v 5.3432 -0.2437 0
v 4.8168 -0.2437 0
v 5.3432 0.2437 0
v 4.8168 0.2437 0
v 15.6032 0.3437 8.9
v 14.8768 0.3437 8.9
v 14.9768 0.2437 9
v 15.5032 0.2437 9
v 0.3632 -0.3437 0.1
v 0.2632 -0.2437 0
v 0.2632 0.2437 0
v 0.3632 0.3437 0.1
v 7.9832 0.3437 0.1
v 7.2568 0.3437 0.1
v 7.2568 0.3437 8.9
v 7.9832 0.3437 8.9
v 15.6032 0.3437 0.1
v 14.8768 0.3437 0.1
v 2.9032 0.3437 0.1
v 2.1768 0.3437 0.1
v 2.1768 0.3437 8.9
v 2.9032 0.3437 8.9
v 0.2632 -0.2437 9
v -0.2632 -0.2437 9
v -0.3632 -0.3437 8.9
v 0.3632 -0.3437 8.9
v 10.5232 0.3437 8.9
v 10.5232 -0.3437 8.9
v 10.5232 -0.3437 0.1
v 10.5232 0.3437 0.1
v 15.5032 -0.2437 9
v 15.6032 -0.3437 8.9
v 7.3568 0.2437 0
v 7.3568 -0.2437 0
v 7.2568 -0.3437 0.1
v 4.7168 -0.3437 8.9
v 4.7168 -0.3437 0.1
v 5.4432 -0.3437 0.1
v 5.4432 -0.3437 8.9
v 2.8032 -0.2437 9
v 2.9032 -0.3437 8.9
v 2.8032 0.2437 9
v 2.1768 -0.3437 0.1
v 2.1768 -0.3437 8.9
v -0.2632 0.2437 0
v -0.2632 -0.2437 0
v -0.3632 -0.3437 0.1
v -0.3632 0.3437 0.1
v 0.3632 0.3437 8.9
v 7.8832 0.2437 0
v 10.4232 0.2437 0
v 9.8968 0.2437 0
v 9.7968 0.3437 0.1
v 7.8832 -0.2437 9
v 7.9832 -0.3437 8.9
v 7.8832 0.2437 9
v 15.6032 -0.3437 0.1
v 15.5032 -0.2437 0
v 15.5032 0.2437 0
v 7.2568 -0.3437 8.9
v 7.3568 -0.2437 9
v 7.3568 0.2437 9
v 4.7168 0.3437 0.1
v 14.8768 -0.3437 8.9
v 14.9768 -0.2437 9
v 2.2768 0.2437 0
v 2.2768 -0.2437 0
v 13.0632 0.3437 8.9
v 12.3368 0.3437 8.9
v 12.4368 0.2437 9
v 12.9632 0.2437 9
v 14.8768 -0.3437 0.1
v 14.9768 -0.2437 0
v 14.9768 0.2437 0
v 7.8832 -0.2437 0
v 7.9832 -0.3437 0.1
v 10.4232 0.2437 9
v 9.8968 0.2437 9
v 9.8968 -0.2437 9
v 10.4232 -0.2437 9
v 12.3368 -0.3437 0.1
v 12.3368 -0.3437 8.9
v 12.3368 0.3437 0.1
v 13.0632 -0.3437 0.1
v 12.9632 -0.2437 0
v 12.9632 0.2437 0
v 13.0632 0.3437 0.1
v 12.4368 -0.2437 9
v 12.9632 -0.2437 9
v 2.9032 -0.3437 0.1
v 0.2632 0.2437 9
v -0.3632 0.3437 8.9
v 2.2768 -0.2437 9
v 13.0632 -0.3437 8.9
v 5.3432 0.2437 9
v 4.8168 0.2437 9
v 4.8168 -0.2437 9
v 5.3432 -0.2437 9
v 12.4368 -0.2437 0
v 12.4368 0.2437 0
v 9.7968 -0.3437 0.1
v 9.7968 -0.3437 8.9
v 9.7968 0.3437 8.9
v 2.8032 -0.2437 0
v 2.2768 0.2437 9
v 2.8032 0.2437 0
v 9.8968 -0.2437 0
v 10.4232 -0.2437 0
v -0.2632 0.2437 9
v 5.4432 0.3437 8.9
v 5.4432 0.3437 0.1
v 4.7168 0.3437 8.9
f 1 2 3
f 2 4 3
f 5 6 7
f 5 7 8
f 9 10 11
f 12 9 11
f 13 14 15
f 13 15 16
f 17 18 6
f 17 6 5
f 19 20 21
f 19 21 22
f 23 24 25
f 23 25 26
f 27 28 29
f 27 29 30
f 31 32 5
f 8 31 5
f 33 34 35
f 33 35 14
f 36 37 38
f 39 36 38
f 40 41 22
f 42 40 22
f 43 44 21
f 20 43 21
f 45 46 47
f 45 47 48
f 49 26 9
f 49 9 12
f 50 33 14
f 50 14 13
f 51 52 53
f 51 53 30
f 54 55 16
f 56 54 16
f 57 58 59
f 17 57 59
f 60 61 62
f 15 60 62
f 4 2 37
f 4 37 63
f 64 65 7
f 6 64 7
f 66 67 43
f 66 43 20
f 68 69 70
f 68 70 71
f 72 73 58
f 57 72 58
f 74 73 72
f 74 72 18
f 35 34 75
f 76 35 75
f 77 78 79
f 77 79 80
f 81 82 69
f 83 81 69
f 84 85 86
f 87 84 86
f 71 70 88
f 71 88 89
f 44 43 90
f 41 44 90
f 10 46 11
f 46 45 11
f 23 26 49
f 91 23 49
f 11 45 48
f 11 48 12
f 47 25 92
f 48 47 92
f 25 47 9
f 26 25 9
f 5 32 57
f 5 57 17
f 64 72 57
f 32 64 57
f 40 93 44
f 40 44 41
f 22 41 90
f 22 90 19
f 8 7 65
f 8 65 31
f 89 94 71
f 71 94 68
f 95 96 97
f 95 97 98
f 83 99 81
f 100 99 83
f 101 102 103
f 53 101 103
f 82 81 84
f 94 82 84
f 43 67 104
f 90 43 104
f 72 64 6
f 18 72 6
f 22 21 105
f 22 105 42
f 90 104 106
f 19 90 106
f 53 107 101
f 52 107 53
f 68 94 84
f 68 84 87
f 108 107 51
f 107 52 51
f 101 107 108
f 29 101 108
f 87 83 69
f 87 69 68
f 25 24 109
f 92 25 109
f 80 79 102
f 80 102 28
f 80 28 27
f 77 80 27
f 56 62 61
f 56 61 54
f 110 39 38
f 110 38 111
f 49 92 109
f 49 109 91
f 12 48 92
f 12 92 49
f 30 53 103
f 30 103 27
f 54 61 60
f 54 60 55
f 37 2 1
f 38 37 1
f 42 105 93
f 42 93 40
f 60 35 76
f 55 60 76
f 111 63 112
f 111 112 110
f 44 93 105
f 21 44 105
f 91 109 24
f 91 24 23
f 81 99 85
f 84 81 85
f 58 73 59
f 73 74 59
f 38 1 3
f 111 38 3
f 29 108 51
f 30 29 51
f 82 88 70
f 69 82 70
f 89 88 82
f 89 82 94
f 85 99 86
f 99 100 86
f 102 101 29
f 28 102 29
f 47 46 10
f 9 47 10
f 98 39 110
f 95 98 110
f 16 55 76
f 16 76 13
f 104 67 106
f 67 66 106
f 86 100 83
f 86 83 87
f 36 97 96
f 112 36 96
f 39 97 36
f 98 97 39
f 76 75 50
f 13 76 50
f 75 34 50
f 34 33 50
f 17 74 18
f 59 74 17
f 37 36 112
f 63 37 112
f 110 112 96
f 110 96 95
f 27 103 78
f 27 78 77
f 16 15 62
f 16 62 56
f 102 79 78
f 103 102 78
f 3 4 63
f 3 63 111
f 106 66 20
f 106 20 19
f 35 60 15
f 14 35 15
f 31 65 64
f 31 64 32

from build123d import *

# Parameters (mm, degrees)
SKETCH_1_W        = 0.726353624
SKETCH_1_H        = 0.687321186
EXTRUDE_1_DEPTH   = 9
EXTRUDE_1_2_DEPTH = 9
EXTRUDE_1_3_DEPTH = 9
EXTRUDE_1_4_DEPTH = 9
EXTRUDE_1_5_DEPTH = 9
EXTRUDE_1_6_DEPTH = 9
EXTRUDE_1_7_DEPTH = 9
CHAMFER_1_SIZE    = 0.1
CHAMFER_2_SIZE    = 0.1
CHAMFER_3_SIZE    = 0.1
CHAMFER_4_SIZE    = 0.1
CHAMFER_5_SIZE    = 0.1
CHAMFER_6_SIZE    = 0.1
CHAMFER_7_SIZE    = 0.1
CHAMFER_8_SIZE    = 0.1
CHAMFER_9_SIZE    = 0.1
CHAMFER_10_SIZE   = 0.1
CHAMFER_11_SIZE   = 0.1
CHAMFER_12_SIZE   = 0.1
CHAMFER_13_SIZE   = 0.1
CHAMFER_14_SIZE   = 0.1


with BuildPart() as part:
    # 草图1 → 凸台-拉伸1 (new body)
    with BuildSketch(Plane.XY):
        with Locations((2.54, 0)):
            Rectangle(SKETCH_1_W, SKETCH_1_H)
    extrude(amount=EXTRUDE_1_DEPTH)

    # 倒角6
    chamfer_6_edges = [part.edges().sort_by_distance(p)[0] for p in [
        (2.54, -0.343660593, 0),
        (2.176823188, 0, 0),
        (2.54, 0.343660593, 0),
        (2.903176812, 0, 0),
    ]]
    chamfer(chamfer_6_edges, length=CHAMFER_6_SIZE)

    # 倒角13
    chamfer_13_edges = [part.edges().sort_by_distance(p)[0] for p in [
        (2.176823188, 0, 9),
        (2.54, -0.343660593, 9),
        (2.903176812, 0, 9),
        (2.54, 0.343660593, 9),
    ]]
    chamfer(chamfer_13_edges, length=CHAMFER_13_SIZE)


with BuildPart() as body_2:
    # 草图1 → Extrude 1 2 (new body)
    with BuildSketch(Plane.XY):
        Rectangle(SKETCH_1_W, SKETCH_1_H)
    extrude(amount=EXTRUDE_1_2_DEPTH)

    # 倒角7
    chamfer_7_edges = [body_2.edges().sort_by_distance(p)[0] for p in [
        (0, -0.343660593, 0),
        (-0.363176812, 0, 0),
        (0, 0.343660593, 0),
        (0.363176812, 0, 0),
    ]]
    chamfer(chamfer_7_edges, length=CHAMFER_7_SIZE)

    # 倒角14
    chamfer_14_edges = [body_2.edges().sort_by_distance(p)[0] for p in [
        (-0.363176812, 0, 9),
        (0, -0.343660593, 9),
        (0.363176812, 0, 9),
        (0, 0.343660593, 9),
    ]]
    chamfer(chamfer_14_edges, length=CHAMFER_14_SIZE)


with BuildPart() as body_3:
    # 草图1 → Extrude 1 3 (new body)
    with BuildSketch(Plane.XY):
        with Locations((5.08, 0)):
            Rectangle(SKETCH_1_W, SKETCH_1_H)
    extrude(amount=EXTRUDE_1_3_DEPTH)

    # 倒角5
    chamfer_5_edges = [body_3.edges().sort_by_distance(p)[0] for p in [
        (5.08, -0.343660593, 0),
        (4.716823188, 0, 0),
        (5.08, 0.343660593, 0),
        (5.443176812, 0, 0),
    ]]
    chamfer(chamfer_5_edges, length=CHAMFER_5_SIZE)

    # 倒角12
    chamfer_12_edges = [body_3.edges().sort_by_distance(p)[0] for p in [
        (4.716823188, 0, 9),
        (5.08, -0.343660593, 9),
        (5.443176812, 0, 9),
        (5.08, 0.343660593, 9),
    ]]
    chamfer(chamfer_12_edges, length=CHAMFER_12_SIZE)


with BuildPart() as body_4:
    # 草图1 → Extrude 1 4 (new body)
    with BuildSketch(Plane.XY):
        with Locations((7.62, 0)):
            Rectangle(SKETCH_1_W, SKETCH_1_H)
    extrude(amount=EXTRUDE_1_4_DEPTH)

    # 倒角4
    chamfer_4_edges = [body_4.edges().sort_by_distance(p)[0] for p in [
        (7.62, -0.343660593, 0),
        (7.256823188, 0, 0),
        (7.62, 0.343660593, 0),
        (7.983176812, 0, 0),
    ]]
    chamfer(chamfer_4_edges, length=CHAMFER_4_SIZE)

    # 倒角11
    chamfer_11_edges = [body_4.edges().sort_by_distance(p)[0] for p in [
        (7.256823188, 0, 9),
        (7.62, -0.343660593, 9),
        (7.983176812, 0, 9),
        (7.62, 0.343660593, 9),
    ]]
    chamfer(chamfer_11_edges, length=CHAMFER_11_SIZE)


with BuildPart() as body_5:
    # 草图1 → Extrude 1 5 (new body)
    with BuildSketch(Plane.XY):
        with Locations((10.16, 0)):
            Rectangle(SKETCH_1_W, SKETCH_1_H)
    extrude(amount=EXTRUDE_1_5_DEPTH)

    # 倒角3
    chamfer_3_edges = [body_5.edges().sort_by_distance(p)[0] for p in [
        (10.16, -0.343660593, 0),
        (9.796823188, 0, 0),
        (10.16, 0.343660593, 0),
        (10.523176812, 0, 0),
    ]]
    chamfer(chamfer_3_edges, length=CHAMFER_3_SIZE)

    # 倒角10
    chamfer_10_edges = [body_5.edges().sort_by_distance(p)[0] for p in [
        (9.796823188, 0, 9),
        (10.16, -0.343660593, 9),
        (10.523176812, 0, 9),
        (10.16, 0.343660593, 9),
    ]]
    chamfer(chamfer_10_edges, length=CHAMFER_10_SIZE)


with BuildPart() as body_6:
    # 草图1 → Extrude 1 6 (new body)
    with BuildSketch(Plane.XY):
        with Locations((12.7, 0)):
            Rectangle(SKETCH_1_W, SKETCH_1_H)
    extrude(amount=EXTRUDE_1_6_DEPTH)

    # 倒角2
    chamfer_2_edges = [body_6.edges().sort_by_distance(p)[0] for p in [
        (12.7, -0.343660593, 0),
        (12.336823188, 0, 0),
        (12.7, 0.343660593, 0),
        (13.063176812, 0, 0),
    ]]
    chamfer(chamfer_2_edges, length=CHAMFER_2_SIZE)

    # 倒角9
    chamfer_9_edges = [body_6.edges().sort_by_distance(p)[0] for p in [
        (12.336823188, 0, 9),
        (12.7, -0.343660593, 9),
        (13.063176812, 0, 9),
        (12.7, 0.343660593, 9),
    ]]
    chamfer(chamfer_9_edges, length=CHAMFER_9_SIZE)


with BuildPart() as body_7:
    # 草图1 → Extrude 1 7 (new body)
    with BuildSketch(Plane.XY):
        with Locations((15.24, 0)):
            Rectangle(SKETCH_1_W, SKETCH_1_H)
    extrude(amount=EXTRUDE_1_7_DEPTH)

    # 倒角1
    chamfer_1_edges = [body_7.edges().sort_by_distance(p)[0] for p in [
        (15.24, -0.343660593, 0),
        (14.876823188, 0, 0),
        (15.24, 0.343660593, 0),
        (15.603176812, 0, 0),
    ]]
    chamfer(chamfer_1_edges, length=CHAMFER_1_SIZE)

    # 倒角8
    chamfer_8_edges = [body_7.edges().sort_by_distance(p)[0] for p in [
        (14.876823188, 0, 9),
        (15.24, -0.343660593, 9),
        (15.603176812, 0, 9),
        (15.24, 0.343660593, 9),
    ]]
    chamfer(chamfer_8_edges, length=CHAMFER_8_SIZE)


solid = Compound([part.part, body_2.part, body_3.part, body_4.part, body_5.part, body_6.part, body_7.part])
